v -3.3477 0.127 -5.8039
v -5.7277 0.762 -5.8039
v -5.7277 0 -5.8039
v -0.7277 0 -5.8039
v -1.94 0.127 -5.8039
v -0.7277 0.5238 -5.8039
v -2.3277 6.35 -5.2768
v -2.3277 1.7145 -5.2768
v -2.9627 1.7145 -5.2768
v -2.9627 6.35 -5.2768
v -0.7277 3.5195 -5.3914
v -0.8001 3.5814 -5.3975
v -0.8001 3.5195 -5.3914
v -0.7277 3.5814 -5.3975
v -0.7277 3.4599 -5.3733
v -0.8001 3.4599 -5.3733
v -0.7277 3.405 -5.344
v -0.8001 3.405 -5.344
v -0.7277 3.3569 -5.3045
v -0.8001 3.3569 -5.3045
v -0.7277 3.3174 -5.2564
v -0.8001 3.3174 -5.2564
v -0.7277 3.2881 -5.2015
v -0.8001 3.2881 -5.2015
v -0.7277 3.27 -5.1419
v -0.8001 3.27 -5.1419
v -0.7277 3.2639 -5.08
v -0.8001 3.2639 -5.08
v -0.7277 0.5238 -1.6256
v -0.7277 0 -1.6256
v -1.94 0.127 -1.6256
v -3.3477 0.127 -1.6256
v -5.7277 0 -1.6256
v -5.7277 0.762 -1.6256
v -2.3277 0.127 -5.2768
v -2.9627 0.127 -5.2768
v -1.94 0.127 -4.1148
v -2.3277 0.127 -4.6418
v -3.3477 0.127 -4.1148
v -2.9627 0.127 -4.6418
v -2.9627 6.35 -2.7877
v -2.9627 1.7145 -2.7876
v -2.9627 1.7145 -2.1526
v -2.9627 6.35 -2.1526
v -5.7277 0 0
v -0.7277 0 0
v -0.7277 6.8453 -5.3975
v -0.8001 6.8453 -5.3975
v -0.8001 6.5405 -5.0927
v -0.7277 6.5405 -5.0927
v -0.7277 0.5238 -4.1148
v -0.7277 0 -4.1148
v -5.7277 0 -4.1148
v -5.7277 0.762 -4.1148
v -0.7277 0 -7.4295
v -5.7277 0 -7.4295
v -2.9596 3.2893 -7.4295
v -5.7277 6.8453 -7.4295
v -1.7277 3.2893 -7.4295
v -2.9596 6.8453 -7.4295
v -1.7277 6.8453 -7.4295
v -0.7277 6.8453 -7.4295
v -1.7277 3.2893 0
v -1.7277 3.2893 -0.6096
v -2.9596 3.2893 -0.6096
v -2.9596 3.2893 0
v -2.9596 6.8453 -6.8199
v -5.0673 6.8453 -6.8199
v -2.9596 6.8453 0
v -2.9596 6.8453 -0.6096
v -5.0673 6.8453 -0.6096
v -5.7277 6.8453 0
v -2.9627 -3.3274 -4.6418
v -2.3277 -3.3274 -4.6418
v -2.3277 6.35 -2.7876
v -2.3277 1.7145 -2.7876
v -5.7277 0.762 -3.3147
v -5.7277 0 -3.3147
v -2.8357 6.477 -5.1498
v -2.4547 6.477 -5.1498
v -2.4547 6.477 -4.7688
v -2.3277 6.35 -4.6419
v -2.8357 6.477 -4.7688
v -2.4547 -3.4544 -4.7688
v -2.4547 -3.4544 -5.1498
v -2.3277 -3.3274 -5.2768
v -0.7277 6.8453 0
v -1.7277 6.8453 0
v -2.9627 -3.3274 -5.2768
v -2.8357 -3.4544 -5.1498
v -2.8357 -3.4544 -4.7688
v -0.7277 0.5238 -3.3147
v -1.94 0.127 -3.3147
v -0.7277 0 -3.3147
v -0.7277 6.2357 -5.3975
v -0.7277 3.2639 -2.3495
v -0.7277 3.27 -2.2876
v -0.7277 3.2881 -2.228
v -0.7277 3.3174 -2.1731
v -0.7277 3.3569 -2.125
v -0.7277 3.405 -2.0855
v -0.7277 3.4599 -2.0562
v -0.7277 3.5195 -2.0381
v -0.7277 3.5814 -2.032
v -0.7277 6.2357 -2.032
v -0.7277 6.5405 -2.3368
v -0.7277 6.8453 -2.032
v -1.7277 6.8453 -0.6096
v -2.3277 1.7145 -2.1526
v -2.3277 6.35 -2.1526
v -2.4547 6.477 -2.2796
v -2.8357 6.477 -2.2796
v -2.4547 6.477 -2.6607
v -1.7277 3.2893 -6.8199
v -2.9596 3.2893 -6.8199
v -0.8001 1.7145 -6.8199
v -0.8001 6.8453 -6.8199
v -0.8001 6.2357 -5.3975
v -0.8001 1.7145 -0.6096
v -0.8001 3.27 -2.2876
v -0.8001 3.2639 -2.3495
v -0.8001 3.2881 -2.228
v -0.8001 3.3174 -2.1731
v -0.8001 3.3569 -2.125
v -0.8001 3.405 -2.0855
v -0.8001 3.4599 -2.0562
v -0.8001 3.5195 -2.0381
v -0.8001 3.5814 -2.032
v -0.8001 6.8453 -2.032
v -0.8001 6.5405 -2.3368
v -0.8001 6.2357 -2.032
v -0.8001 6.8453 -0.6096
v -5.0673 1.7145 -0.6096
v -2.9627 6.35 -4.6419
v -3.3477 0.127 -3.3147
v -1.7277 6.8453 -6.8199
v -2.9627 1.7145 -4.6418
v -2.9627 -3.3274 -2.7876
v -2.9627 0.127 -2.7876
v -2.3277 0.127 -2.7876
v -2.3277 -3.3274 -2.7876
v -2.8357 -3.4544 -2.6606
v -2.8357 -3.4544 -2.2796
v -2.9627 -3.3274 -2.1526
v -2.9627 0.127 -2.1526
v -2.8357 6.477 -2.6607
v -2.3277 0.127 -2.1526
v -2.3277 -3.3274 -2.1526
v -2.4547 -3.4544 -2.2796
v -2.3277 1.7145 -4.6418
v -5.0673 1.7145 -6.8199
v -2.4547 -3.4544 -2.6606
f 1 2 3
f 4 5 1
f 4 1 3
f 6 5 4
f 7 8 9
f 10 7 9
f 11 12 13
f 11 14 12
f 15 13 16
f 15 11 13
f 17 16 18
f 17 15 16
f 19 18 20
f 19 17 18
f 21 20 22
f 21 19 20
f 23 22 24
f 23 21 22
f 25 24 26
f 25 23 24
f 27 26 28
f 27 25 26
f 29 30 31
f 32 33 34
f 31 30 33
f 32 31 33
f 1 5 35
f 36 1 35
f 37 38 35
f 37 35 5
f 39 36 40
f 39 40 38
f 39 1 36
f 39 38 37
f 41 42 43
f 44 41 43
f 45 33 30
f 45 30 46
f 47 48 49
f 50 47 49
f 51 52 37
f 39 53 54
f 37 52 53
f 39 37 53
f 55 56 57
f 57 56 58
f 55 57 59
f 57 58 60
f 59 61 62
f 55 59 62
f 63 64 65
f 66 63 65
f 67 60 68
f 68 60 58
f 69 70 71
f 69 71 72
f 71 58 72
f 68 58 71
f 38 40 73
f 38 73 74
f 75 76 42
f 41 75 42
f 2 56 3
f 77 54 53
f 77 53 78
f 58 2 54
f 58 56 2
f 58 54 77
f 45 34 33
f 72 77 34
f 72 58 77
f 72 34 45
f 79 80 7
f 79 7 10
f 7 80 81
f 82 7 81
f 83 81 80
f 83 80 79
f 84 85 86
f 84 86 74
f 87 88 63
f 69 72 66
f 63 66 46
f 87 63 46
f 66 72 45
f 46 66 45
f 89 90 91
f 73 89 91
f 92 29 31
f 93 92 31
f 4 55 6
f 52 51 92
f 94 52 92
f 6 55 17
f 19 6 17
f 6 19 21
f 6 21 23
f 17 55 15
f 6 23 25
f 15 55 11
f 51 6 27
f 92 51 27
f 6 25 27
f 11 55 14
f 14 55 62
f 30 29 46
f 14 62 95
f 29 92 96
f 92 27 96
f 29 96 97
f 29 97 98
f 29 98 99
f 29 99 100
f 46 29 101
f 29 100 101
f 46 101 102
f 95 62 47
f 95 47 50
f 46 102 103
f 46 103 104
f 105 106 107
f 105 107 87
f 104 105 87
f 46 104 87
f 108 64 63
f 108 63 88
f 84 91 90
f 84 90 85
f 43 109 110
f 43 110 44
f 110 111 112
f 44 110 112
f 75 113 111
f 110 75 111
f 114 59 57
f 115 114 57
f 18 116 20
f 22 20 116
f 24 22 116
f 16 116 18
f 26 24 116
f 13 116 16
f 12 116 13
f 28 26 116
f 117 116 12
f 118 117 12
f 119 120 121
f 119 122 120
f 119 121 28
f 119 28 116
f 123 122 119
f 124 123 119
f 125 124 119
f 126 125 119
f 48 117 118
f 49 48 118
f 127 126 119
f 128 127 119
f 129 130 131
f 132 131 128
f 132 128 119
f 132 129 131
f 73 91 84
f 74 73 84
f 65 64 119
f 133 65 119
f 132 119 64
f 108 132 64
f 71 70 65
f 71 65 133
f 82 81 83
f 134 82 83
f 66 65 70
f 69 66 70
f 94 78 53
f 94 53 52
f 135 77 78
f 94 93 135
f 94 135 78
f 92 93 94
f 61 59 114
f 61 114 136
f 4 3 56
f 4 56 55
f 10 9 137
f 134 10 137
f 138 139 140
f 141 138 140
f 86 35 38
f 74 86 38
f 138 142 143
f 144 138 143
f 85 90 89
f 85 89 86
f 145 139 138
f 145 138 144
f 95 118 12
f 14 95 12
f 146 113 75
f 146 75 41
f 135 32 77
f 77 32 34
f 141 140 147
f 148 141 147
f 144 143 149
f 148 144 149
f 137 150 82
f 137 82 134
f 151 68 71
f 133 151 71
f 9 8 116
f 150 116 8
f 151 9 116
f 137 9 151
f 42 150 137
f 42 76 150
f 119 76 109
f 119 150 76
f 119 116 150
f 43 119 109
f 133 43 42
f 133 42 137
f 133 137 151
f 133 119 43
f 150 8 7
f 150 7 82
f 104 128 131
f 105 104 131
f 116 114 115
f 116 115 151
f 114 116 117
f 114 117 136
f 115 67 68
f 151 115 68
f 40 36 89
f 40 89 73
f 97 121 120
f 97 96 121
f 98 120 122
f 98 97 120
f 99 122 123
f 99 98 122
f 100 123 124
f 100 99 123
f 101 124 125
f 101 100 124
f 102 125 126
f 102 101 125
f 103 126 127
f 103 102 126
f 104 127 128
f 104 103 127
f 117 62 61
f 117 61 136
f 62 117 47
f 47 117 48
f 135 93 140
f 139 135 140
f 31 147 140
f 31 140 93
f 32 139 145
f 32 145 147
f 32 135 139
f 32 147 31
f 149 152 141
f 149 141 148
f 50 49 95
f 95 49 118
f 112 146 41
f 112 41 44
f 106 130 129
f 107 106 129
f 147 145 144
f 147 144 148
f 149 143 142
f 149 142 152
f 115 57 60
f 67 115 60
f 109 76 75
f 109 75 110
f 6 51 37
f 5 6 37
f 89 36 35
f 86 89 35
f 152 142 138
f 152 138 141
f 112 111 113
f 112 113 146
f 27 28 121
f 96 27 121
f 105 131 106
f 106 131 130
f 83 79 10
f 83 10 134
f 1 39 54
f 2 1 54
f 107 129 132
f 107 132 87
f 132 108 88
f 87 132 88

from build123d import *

# Parameters (mm, degrees)
SKETCH1_W           = 6.8453
SKETCH1_H           = 7.4295
BOSS_EXTRUDE1_DEPTH = 5
SKETCH2_W           = 5.8039
SKETCH2_H           = 0.127
CUT_EXTRUDE1_DEPTH  = 5.7277
CUT_EXTRUDE2_DEPTH  = 1.6891
CUT_EXTRUDE3_DEPTH  = 1.6891
SKETCH5_W           = 5
SKETCH5_H           = 4.1148
BOSS_EXTRUDE2_DEPTH = 0.127
SKETCH6_W           = 3.3147
SKETCH6_H           = 0.127
CUT_EXTRUDE4_DEPTH  = 6
CUT_EXTRUDE5_DEPTH  = 1.6891
CUT_EXTRUDE6_DEPTH  = 1.6891
SKETCH9_W           = 5
SKETCH9_H           = 1.6256
BOSS_EXTRUDE3_DEPTH = 0.127
SKETCH10_W          = 4.2672
SKETCH10_H          = 6.2103
CUT_EXTRUDE7_DEPTH  = 5.1308
CUT_EXTRUDE8_DEPTH  = 1.0724
SKETCH12_W          = 1.2319
SKETCH12_H          = 3.556
CUT_EXTRUDE9_DEPTH  = 1.6096
SKETCH13_W          = 1.2319
SKETCH13_H          = 3.556
CUT_EXTRUDE10_DEPTH = 8.4295
SKETCH14_W          = 0.635
SKETCH14_H          = 0.635
BOSS_EXTRUDE4_DEPTH = 3.5814
SKETCH15_W          = 0.635
SKETCH15_H          = 0.635
BOSS_EXTRUDE5_DEPTH = 3.5814
SKETCH16_W          = 0.635
SKETCH16_H          = 0.635
BOSS_EXTRUDE6_DEPTH = 4.7625
SKETCH17_W          = 0.635
SKETCH17_H          = 0.635
BOSS_EXTRUDE7_DEPTH = 4.7625
DRAFT1_ANGLE        = 45
DRAFT2_ANGLE        = 45
CHAMFER1_SIZE       = 0.127
FILLET1_R           = 0.3175


with BuildPart() as part:
    # Sketch1 → Boss-Extrude1 (new body)
    with BuildSketch(Plane(origin=(-5.7277, 0, 0), x_dir=(0, -1, 0), z_dir=(-1, 0, 0))):
        with Locations((-3.42265, -3.71475)):
            Rectangle(SKETCH1_W, SKETCH1_H)
    extrude(amount=-BOSS_EXTRUDE1_DEPTH)

    # Sketch2 → Cut-Extrude1 (cut)
    with BuildSketch(Plane.ZY.offset(5.7277)):
        with Locations((-4.52755, 0.0635)):
            Rectangle(SKETCH2_W, SKETCH2_H)
    extrude(amount=-CUT_EXTRUDE1_DEPTH, mode=Mode.SUBTRACT)

    # Sketch3 → Cut-Extrude2 (cut)
    with BuildSketch(Plane.XY.offset(-1.6256)):
        Polygon((-5.7277, 0.127), (-3.3477, 0.127), (-5.7277, 0.762), align=None)
    extrude(amount=-CUT_EXTRUDE2_DEPTH, mode=Mode.SUBTRACT)

    # Sketch4 → Cut-Extrude3 (cut)
    with BuildSketch(Plane.XY.offset(-1.6256)):
        Polygon((-1.94, 0.127), (0, 0.127), (0, 0.762), align=None)
    extrude(amount=-CUT_EXTRUDE3_DEPTH, mode=Mode.SUBTRACT)

    # Sketch5 → Boss-Extrude2 (add)
    with BuildSketch(Plane.XZ.offset(-0.127)):
        with Locations((-3.2277, -5.3721)):
            Rectangle(SKETCH5_W, SKETCH5_H)
    extrude(amount=BOSS_EXTRUDE2_DEPTH)

    # Sketch6 → Cut-Extrude4 (cut, through all)
    with BuildSketch(Plane.ZY.offset(5.7277)):
        with Locations((-5.77215, 0.0635)):
            Rectangle(SKETCH6_W, SKETCH6_H)
    extrude(amount=-CUT_EXTRUDE4_DEPTH, mode=Mode.SUBTRACT)

    # Sketch7 → Cut-Extrude5 (cut)
    with BuildSketch(Plane.XY.offset(-4.1148)):
        Polygon((-5.7277, 0.127), (-3.3477, 0.127), (-5.7277, 0.762), align=None)
    extrude(amount=-CUT_EXTRUDE5_DEPTH, mode=Mode.SUBTRACT)

    # Sketch8 → Cut-Extrude6 (cut)
    with BuildSketch(Plane.XY.offset(-4.1148)):
        Polygon((-1.94, 0.127), (0, 0.127), (0, 0.762), align=None)
    extrude(amount=-CUT_EXTRUDE6_DEPTH, mode=Mode.SUBTRACT)

    # Sketch9 → Boss-Extrude3 (add)
    with BuildSketch(Plane.XZ.offset(-0.127)):
        with Locations((-3.2277, -6.6167)):
            Rectangle(SKETCH9_W, SKETCH9_H)
    extrude(amount=BOSS_EXTRUDE3_DEPTH)

    # Sketch10 → Cut-Extrude7 (cut)
    with BuildSketch(Plane(origin=(0, 6.8453, 0), x_dir=(-1, 0, 0), z_dir=(0, 1, 0))):
        with Locations((2.9337, -3.71475)):
            Rectangle(SKETCH10_W, SKETCH10_H)
    extrude(amount=-CUT_EXTRUDE7_DEPTH, mode=Mode.SUBTRACT)

    # Sketch11 → Cut-Extrude8 (cut, through all)
    with BuildSketch(Plane.ZY.offset(0.8001)):
        Polygon((-2.032, 6.8453), (-5.3975, 6.8453), (-4.7879, 6.2357), (-5.3975, 6.2357), (-5.3975, 3.2639), (-2.032, 3.2639), (-2.032, 6.2357), (-2.6416, 6.2357), align=None)
    extrude(amount=-CUT_EXTRUDE8_DEPTH, mode=Mode.SUBTRACT)

    # Sketch12 → Cut-Extrude9 (cut, through all)
    with BuildSketch(Plane(origin=(0, 0, -0.6096), x_dir=(-1, 0, 0), z_dir=(0, 0, -1))):
        with Locations((2.34365, 5.0673)):
            Rectangle(SKETCH12_W, SKETCH12_H)
    extrude(amount=-CUT_EXTRUDE9_DEPTH, mode=Mode.SUBTRACT)

    # Sketch13 → Cut-Extrude10 (cut, through all)
    with BuildSketch(Plane(origin=(0, 0, -7.4295), x_dir=(-1, 0, 0), z_dir=(0, 0, -1))):
        with Locations((2.34365, 5.0673)):
            Rectangle(SKETCH13_W, SKETCH13_H)
    extrude(amount=-CUT_EXTRUDE10_DEPTH, mode=Mode.SUBTRACT)

    # Sketch14 → Boss-Extrude4 (add)
    with BuildSketch(Plane.XZ.offset(-0.127)):
        with Locations((-2.6452, -4.95935)):
            Rectangle(SKETCH14_W, SKETCH14_H)
    extrude(amount=BOSS_EXTRUDE4_DEPTH)

    # Sketch15 → Boss-Extrude5 (add)
    with BuildSketch(Plane.XZ.offset(-0.127)):
        with Locations((-2.6452, -2.47015)):
            Rectangle(SKETCH15_W, SKETCH15_H)
    extrude(amount=BOSS_EXTRUDE5_DEPTH)

    # Sketch16 → Boss-Extrude6 (add)
    with BuildSketch(Plane(origin=(0, 1.7145, 0), x_dir=(-1, 0, 0), z_dir=(0, 1, 0))):
        with Locations((2.6452, -4.95935)):
            Rectangle(SKETCH16_W, SKETCH16_H)
    extrude(amount=BOSS_EXTRUDE6_DEPTH)

    # Sketch17 → Boss-Extrude7 (add)
    with BuildSketch(Plane(origin=(0, 1.7145, 0), x_dir=(-1, 0, 0), z_dir=(0, 1, 0))):
        with Locations((2.6452, -2.47015)):
            Rectangle(SKETCH17_W, SKETCH17_H)
    extrude(amount=BOSS_EXTRUDE7_DEPTH)

    # Draft1
    draft1_faces = [part.faces().sort_by_distance(p)[0] for p in [
        (-0.7639, 6.2357, -2.3368),
    ]]
    draft(draft1_faces, Plane(origin=(-0.7277, 3.2639, -2.032), x_dir=(-1, 0, 0), z_dir=(0, 0, -1)), DRAFT1_ANGLE)

    # Draft2
    draft2_faces = [part.faces().sort_by_distance(p)[0] for p in [
        (-0.7639, 6.2357, -5.0927),
    ]]
    draft(draft2_faces, Plane(origin=(-0.7277, 6.2357, -5.3975), x_dir=(1, 0, 0), z_dir=(0, 0, 1)), DRAFT2_ANGLE)

    # Chamfer1
    chamfer1_edges = [part.edges().sort_by_distance(p)[0] for p in [
        (-2.3277, -3.4544, -4.95935),
        (-2.6452, -3.4544, -4.64185),
        (-2.9627, -3.4544, -4.95935),
        (-2.6452, -3.4544, -5.27685),
        (-2.9627, -3.4544, -2.47015),
        (-2.6452, -3.4544, -2.78765),
        (-2.3277, -3.4544, -2.47015),
        (-2.6452, -3.4544, -2.15265),
        (-2.6452, 6.477, -4.64185),
        (-2.3277, 6.477, -4.95935),
        (-2.6452, 6.477, -5.27685),
        (-2.9627, 6.477, -4.95935),
        (-2.3277, 6.477, -2.47015),
        (-2.6452, 6.477, -2.78765),
        (-2.9627, 6.477, -2.47015),
        (-2.6452, 6.477, -2.15265),
    ]]
    chamfer(chamfer1_edges, length=CHAMFER1_SIZE)

    # Fillet1
    fillet1_edges = [part.edges().sort_by_distance(p)[0] for p in [
        (-0.7639, 3.2639, -2.032),
        (-0.7639, 3.2639, -5.3975),
    ]]
    fillet(fillet1_edges, radius=FILLET1_R)


solid = part.part
